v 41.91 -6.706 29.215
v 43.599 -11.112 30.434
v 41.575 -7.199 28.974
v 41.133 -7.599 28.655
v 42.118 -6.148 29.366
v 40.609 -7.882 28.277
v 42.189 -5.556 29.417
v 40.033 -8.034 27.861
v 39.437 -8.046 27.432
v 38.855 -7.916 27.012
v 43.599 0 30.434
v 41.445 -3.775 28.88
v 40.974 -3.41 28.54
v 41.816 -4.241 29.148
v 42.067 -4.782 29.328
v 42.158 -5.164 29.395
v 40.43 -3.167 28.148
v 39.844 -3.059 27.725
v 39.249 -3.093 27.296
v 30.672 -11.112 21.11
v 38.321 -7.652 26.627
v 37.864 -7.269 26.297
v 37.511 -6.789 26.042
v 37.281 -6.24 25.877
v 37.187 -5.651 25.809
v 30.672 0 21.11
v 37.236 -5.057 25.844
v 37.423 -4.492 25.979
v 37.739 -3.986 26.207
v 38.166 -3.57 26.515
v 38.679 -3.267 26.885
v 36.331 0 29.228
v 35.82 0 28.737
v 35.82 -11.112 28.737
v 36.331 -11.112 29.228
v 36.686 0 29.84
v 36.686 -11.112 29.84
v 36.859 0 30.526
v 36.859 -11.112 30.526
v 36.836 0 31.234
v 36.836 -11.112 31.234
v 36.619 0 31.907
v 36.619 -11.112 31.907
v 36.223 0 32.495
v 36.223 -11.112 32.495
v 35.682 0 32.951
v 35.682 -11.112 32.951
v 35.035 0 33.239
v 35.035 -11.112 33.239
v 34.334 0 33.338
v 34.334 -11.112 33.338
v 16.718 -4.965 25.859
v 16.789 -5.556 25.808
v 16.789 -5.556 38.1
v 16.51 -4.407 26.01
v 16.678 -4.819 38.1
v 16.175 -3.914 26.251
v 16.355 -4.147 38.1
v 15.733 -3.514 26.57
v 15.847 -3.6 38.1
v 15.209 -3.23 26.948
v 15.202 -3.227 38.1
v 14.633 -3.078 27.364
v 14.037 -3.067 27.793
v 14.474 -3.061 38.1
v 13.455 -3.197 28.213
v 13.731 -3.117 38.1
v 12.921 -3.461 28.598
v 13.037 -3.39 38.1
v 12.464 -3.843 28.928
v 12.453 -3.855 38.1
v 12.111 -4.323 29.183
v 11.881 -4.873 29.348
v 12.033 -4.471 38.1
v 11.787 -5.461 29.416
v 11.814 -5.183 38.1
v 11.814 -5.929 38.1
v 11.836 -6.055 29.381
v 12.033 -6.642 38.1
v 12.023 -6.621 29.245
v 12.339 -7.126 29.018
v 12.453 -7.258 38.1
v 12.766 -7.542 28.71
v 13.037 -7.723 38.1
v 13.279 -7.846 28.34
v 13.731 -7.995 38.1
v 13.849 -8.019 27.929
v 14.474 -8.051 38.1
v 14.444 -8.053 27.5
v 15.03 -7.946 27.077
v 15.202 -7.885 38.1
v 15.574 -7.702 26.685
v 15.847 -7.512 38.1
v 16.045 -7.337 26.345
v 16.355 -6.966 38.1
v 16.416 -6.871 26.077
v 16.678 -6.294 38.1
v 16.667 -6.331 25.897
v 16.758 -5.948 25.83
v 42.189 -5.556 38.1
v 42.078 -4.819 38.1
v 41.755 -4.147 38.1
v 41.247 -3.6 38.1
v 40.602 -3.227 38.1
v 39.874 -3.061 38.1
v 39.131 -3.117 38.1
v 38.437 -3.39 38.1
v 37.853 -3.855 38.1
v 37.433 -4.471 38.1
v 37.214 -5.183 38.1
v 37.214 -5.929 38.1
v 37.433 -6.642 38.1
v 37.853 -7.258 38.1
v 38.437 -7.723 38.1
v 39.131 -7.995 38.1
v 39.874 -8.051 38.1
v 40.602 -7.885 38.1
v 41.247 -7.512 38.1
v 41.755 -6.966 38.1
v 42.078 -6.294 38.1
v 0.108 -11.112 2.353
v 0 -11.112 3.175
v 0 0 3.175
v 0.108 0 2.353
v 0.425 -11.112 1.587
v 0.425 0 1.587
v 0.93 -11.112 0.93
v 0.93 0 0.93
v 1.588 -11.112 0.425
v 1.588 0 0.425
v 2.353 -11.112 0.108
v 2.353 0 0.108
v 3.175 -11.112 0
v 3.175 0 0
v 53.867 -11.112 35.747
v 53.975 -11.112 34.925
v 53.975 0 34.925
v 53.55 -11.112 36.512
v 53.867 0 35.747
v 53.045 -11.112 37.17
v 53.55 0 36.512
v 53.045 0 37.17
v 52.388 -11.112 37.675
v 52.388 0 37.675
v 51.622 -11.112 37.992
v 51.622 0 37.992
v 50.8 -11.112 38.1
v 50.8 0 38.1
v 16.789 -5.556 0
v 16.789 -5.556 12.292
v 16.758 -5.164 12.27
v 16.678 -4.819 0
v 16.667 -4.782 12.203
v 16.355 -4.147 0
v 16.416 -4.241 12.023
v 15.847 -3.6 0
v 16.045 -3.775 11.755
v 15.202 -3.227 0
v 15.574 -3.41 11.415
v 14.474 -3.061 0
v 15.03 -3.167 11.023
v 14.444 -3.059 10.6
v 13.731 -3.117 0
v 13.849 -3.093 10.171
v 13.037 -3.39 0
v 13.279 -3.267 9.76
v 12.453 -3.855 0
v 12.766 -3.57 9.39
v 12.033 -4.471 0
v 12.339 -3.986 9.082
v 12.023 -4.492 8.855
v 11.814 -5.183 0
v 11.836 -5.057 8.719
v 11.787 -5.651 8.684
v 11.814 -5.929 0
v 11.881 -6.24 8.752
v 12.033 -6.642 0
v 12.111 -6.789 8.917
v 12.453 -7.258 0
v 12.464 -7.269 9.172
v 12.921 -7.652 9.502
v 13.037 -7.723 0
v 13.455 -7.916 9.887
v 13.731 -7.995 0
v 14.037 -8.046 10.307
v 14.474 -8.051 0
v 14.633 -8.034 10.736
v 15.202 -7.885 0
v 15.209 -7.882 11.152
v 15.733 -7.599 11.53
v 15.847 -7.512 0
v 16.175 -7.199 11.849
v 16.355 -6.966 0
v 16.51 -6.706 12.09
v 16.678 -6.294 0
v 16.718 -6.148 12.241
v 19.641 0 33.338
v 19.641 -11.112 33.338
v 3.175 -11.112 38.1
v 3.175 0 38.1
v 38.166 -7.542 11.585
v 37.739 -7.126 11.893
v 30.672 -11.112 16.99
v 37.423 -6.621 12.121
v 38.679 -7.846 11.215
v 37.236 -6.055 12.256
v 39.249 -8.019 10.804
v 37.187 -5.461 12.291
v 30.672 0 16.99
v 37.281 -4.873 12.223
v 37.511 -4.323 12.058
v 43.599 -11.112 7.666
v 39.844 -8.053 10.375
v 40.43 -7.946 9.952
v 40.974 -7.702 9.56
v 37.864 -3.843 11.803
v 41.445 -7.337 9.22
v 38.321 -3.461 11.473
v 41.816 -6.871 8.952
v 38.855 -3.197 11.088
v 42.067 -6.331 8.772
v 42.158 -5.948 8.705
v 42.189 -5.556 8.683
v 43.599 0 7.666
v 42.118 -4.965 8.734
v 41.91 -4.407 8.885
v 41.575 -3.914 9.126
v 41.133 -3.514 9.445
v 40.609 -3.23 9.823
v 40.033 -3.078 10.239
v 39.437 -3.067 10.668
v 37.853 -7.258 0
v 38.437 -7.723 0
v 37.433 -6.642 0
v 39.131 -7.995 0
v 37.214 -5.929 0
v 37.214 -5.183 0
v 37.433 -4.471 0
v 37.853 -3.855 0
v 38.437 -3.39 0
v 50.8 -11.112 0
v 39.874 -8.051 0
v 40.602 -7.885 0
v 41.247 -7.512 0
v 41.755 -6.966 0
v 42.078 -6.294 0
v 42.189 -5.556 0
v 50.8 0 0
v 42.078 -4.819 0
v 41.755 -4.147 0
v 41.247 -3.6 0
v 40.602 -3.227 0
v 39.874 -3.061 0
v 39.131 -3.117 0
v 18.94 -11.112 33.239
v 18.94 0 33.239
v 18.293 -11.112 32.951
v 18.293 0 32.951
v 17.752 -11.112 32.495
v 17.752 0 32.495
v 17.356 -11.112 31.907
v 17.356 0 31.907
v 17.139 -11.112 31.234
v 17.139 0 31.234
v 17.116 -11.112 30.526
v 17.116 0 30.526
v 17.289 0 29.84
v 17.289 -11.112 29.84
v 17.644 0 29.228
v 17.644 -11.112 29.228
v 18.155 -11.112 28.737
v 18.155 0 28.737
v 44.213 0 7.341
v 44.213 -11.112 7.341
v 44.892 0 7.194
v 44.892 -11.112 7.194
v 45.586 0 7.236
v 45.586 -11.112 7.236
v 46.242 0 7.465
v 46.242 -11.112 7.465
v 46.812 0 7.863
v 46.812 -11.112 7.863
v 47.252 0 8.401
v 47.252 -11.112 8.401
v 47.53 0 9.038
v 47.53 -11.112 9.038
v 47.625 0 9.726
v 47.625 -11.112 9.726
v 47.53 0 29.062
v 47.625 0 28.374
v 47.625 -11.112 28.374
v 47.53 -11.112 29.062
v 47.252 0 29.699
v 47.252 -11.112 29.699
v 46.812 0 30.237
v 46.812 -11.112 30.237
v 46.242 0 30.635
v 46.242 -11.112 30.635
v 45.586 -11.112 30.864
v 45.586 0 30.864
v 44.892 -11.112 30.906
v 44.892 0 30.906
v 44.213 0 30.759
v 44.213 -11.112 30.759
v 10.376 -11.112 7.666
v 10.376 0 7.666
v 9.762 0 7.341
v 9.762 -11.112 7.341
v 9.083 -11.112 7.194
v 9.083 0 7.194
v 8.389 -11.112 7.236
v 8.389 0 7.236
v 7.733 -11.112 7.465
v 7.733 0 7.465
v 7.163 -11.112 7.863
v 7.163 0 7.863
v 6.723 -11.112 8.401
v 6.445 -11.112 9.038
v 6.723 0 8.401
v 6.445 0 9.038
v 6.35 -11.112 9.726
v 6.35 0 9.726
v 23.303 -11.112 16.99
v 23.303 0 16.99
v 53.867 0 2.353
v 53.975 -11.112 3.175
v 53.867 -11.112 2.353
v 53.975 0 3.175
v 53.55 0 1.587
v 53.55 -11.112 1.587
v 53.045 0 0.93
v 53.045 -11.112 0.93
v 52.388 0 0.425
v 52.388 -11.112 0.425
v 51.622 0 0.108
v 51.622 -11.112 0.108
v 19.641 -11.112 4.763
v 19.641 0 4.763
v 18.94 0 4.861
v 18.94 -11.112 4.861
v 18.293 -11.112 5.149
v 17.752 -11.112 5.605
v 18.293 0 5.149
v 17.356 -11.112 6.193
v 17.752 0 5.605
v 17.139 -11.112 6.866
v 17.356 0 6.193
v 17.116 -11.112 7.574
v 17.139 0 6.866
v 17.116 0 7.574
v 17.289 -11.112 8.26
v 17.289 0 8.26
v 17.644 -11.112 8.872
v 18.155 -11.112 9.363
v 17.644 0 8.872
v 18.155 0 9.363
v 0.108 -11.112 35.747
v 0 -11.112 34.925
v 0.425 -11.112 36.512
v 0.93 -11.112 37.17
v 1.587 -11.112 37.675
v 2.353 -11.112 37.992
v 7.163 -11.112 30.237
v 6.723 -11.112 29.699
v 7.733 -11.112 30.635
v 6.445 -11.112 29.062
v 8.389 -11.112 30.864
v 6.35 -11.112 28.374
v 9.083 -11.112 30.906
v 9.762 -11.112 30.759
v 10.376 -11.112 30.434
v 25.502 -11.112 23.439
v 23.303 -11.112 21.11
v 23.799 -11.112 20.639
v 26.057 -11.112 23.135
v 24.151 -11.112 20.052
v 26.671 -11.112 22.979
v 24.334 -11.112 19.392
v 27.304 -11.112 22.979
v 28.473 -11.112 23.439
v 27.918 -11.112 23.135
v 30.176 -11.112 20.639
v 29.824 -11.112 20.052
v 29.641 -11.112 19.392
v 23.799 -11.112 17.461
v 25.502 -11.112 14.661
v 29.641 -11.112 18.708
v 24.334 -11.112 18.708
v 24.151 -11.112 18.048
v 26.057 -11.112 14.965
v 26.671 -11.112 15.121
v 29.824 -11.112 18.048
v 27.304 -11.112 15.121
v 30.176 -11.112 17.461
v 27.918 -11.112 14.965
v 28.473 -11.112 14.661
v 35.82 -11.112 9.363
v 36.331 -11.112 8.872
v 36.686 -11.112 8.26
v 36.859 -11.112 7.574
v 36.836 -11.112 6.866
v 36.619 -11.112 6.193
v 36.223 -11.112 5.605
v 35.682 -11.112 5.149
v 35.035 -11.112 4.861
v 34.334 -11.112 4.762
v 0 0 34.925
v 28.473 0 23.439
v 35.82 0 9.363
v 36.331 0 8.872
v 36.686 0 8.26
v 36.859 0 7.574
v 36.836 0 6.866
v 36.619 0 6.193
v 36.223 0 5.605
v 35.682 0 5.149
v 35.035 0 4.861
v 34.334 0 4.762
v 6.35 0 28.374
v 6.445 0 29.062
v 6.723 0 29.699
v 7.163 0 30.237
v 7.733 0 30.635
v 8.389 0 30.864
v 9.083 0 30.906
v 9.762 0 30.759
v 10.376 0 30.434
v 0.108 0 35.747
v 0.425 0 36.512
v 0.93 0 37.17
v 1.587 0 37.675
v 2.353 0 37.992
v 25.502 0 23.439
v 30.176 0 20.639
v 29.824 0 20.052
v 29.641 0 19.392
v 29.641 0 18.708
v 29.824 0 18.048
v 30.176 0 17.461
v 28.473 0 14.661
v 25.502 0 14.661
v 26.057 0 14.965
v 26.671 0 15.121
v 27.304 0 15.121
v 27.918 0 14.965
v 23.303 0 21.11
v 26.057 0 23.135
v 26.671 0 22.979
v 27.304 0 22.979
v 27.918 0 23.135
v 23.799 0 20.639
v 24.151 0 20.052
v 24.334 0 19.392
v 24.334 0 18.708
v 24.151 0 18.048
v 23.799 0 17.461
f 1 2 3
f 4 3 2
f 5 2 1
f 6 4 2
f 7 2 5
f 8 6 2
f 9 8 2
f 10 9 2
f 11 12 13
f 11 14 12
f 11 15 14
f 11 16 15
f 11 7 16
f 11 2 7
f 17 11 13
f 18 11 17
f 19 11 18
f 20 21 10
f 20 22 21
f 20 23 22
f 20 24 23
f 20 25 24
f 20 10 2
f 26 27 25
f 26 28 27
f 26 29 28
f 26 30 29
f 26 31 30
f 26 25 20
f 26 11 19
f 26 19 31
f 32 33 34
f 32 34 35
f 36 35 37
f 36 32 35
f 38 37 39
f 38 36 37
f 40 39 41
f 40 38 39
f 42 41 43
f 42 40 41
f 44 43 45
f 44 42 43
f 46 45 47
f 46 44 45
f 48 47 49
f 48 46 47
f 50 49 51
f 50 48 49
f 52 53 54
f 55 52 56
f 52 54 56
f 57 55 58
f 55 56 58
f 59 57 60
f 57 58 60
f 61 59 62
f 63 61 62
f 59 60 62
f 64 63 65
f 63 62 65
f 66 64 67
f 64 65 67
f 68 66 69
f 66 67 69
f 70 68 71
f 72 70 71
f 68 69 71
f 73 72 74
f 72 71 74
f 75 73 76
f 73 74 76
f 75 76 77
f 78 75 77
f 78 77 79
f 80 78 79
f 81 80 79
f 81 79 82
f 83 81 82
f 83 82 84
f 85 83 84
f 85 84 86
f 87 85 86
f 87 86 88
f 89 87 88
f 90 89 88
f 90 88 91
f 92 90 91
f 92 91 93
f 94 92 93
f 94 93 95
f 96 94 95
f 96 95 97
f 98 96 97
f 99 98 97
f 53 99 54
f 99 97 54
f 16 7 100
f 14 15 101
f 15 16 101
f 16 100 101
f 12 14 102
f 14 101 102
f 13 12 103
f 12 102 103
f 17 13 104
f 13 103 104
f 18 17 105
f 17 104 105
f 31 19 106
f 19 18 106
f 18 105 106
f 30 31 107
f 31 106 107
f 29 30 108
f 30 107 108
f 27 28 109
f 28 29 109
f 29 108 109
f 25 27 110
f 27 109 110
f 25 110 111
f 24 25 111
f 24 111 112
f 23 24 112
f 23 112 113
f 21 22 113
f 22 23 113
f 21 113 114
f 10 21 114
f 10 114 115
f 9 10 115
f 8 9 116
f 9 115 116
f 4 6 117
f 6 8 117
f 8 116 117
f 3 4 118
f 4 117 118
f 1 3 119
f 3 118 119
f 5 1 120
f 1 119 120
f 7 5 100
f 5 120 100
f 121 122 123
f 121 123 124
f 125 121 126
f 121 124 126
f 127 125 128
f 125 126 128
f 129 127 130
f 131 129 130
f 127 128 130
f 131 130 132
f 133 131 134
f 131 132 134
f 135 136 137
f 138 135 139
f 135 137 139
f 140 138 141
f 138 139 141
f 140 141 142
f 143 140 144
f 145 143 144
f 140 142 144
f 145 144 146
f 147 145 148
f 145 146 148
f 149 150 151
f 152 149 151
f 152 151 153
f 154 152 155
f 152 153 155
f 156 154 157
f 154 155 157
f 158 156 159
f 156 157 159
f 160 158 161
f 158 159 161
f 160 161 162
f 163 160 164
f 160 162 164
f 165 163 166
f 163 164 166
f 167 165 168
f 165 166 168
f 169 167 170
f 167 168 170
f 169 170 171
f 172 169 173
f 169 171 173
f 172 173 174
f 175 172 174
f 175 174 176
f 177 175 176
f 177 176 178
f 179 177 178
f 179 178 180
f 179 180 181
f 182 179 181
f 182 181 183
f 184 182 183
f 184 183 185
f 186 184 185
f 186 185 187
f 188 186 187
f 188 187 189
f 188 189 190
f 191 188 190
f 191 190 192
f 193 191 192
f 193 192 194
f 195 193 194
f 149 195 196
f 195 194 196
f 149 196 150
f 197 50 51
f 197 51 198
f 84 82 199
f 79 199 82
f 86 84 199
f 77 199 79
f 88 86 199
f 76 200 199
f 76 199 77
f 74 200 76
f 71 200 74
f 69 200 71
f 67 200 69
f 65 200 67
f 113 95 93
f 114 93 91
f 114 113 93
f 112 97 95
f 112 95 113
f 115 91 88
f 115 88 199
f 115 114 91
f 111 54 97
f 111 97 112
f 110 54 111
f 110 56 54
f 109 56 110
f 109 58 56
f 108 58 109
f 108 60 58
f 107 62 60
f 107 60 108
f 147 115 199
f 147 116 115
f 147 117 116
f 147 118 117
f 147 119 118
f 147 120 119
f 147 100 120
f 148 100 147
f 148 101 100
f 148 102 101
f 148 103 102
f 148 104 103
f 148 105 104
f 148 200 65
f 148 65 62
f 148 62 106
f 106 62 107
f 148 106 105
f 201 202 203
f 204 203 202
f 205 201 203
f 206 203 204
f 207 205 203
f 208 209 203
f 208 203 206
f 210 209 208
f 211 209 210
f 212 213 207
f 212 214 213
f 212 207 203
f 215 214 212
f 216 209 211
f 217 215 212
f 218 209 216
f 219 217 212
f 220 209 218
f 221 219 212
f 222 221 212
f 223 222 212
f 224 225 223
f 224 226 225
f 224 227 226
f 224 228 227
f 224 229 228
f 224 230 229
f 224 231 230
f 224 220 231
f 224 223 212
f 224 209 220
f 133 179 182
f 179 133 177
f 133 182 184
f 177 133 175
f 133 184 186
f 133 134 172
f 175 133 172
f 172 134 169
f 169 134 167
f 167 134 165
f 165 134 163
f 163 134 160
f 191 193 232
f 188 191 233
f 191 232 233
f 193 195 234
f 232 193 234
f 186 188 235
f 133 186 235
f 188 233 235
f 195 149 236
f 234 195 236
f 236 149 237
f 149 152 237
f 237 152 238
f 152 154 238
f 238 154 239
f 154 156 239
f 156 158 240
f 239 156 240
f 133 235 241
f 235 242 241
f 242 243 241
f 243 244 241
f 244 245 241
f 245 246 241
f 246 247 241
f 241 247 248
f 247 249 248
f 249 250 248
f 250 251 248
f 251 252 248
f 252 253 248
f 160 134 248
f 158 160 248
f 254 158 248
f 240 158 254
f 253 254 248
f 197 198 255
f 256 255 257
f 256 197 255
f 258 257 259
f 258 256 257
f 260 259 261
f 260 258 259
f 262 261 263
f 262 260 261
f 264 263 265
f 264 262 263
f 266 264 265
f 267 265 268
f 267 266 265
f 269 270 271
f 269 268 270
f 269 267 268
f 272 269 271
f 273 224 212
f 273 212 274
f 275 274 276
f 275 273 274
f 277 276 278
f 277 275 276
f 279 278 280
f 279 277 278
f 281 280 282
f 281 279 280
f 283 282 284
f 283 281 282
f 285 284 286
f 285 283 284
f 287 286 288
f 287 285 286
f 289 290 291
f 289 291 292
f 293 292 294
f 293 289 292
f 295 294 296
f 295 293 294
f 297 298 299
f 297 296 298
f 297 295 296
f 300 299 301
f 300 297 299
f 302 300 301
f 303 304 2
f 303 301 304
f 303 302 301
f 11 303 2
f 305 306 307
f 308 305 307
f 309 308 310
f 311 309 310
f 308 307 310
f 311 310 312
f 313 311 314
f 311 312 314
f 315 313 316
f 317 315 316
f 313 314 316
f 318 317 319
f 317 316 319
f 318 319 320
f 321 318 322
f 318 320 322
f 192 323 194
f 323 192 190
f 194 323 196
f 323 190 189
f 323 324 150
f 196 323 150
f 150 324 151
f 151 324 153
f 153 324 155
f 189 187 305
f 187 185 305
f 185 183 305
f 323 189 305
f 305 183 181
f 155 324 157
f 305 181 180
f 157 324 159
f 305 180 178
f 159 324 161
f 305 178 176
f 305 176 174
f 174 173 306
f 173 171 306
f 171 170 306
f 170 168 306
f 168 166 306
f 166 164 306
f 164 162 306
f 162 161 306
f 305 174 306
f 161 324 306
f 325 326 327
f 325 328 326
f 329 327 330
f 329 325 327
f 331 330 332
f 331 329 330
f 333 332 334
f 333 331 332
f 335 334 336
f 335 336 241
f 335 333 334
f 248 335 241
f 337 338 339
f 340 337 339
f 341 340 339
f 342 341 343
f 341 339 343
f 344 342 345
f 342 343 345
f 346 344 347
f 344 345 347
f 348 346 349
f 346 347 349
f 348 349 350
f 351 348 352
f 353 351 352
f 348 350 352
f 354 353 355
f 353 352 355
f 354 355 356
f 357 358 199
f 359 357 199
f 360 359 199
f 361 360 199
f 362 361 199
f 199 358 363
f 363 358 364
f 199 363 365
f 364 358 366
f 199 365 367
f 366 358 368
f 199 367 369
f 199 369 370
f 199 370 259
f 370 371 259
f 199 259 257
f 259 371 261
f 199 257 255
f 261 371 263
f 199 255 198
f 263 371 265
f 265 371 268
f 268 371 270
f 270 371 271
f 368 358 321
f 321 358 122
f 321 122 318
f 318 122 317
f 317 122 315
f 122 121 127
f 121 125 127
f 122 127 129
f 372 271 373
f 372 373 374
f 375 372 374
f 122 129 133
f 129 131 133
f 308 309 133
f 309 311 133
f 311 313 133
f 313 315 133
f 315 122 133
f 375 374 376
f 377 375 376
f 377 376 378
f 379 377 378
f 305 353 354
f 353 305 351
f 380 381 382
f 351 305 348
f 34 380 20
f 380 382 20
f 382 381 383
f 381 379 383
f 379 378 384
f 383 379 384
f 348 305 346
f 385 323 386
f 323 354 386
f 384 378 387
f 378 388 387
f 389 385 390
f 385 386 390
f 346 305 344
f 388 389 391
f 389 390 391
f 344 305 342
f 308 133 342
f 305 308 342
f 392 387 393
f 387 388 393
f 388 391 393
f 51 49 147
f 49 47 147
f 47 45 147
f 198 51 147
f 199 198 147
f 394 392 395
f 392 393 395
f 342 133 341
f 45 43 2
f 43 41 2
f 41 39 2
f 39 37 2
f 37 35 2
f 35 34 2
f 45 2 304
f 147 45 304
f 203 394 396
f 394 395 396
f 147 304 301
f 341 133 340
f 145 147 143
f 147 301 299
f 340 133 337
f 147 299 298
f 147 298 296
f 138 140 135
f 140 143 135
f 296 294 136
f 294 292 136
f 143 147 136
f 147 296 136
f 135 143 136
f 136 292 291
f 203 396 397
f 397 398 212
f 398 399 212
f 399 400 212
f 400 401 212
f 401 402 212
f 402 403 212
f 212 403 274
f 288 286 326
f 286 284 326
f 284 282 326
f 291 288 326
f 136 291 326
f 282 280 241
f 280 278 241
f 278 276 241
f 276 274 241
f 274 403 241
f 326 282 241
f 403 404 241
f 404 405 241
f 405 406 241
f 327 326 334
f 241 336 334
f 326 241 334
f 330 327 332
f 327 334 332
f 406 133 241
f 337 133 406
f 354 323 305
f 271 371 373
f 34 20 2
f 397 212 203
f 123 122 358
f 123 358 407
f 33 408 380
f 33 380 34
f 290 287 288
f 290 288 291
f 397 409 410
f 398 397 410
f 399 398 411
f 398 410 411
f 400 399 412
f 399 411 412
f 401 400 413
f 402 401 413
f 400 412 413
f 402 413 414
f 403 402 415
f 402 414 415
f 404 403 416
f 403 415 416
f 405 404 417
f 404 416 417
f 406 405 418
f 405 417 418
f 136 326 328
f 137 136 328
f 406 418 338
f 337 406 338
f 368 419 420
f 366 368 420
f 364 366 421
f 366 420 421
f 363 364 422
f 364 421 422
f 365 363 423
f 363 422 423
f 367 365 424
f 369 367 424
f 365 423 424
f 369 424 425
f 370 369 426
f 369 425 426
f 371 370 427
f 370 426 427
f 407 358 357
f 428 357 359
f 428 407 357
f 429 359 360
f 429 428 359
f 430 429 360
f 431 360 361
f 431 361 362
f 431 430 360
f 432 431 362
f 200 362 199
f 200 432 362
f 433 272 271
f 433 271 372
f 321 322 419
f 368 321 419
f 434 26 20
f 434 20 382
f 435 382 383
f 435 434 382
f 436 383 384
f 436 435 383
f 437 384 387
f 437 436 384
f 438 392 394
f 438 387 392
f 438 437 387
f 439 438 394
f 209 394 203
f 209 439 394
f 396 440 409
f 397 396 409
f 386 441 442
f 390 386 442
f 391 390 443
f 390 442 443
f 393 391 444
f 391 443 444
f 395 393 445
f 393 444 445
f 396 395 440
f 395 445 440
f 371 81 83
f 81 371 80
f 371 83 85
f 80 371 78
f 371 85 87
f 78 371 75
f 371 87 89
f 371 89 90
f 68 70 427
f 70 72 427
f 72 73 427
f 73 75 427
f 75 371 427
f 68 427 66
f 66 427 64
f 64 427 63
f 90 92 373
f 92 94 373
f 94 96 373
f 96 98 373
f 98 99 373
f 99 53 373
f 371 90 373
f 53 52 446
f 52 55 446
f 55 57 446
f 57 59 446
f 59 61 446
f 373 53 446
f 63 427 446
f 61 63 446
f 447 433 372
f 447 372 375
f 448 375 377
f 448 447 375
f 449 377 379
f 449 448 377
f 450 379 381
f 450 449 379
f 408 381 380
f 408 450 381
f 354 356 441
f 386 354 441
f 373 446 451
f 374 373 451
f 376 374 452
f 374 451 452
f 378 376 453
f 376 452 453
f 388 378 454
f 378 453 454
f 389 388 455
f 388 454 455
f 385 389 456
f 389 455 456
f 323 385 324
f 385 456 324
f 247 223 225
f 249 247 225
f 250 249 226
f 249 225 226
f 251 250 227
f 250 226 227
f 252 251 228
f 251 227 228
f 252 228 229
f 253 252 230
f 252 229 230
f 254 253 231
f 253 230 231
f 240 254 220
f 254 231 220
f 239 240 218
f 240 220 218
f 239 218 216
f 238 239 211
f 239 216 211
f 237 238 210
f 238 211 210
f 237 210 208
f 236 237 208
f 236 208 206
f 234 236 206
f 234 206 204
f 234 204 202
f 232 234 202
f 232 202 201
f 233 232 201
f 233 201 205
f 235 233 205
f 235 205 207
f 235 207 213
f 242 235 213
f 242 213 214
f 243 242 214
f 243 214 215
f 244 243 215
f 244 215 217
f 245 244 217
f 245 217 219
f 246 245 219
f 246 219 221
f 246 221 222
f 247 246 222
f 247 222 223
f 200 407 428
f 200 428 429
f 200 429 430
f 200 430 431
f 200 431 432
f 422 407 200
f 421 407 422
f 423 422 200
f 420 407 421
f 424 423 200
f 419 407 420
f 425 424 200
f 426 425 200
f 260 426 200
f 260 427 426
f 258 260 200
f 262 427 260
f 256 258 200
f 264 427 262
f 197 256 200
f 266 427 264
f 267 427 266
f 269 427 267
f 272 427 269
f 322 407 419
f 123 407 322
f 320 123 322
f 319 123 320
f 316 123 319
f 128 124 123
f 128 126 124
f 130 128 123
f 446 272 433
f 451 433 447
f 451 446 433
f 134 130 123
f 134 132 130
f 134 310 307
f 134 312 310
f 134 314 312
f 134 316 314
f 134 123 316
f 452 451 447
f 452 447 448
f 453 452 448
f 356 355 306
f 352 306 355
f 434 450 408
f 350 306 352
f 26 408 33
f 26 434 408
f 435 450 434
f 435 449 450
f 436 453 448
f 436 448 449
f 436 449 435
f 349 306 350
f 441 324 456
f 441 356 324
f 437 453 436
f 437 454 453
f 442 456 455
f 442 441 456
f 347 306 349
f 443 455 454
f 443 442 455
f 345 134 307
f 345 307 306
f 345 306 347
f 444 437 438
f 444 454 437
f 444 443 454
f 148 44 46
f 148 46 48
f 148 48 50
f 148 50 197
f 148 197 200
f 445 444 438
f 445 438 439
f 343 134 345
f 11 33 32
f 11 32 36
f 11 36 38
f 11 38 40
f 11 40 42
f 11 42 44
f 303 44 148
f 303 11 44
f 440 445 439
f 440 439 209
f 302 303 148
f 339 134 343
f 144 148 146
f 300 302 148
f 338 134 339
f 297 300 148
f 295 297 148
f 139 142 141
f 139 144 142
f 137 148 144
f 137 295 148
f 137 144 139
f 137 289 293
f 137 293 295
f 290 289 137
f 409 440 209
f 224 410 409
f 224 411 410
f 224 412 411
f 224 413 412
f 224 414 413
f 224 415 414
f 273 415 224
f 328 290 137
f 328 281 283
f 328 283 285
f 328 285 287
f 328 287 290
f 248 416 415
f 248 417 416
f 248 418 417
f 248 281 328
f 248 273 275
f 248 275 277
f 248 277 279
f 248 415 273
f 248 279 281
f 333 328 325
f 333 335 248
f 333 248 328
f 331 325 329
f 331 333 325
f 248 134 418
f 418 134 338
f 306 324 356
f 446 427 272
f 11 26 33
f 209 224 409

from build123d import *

# Parameters (mm, degrees)
SKETCH1_W           = 53.975
SKETCH1_H           = 11.1125
BOSS_EXTRUDE1_DEPTH = 38.1
FILLET1_R           = 3.175
CUT_EXTRUDE1_DEPTH  = 67.995509411
SKETCH3_R           = 2.5019
CUT_EXTRUDE2_DEPTH  = 38.1


with BuildPart() as part:
    # Sketch1 → Boss-Extrude1 (new body)
    with BuildSketch(Plane.XY):
        with Locations((26.9875, -5.55625)):
            Rectangle(SKETCH1_W, SKETCH1_H)
    extrude(amount=BOSS_EXTRUDE1_DEPTH)

    # Fillet1
    fillet1_edges = [part.edges().sort_by_distance(p)[0] for p in [
        (0, -5.55625, 38.1),
        (0, -5.55625, 0),
        (53.975, -5.55625, 0),
        (53.975, -5.55625, 38.1),
    ]]
    fillet(fillet1_edges, radius=FILLET1_R)

    # Sketch2 → Cut-Extrude1 (cut, through all)
    with BuildSketch(Plane(origin=(0, 0, 0), x_dir=(1, 0, 0), z_dir=(0, 1, 0))):
        with BuildLine():
            Line((6.35, -9.726273849), (6.35, -28.373726151))
            ThreePointArc((6.35, -28.373726151), (7.732948935, -30.63488356), (10.375852624, -30.433784883))
            Line((10.375852624, -30.433784883), (23.302722469, -21.110058732))
            ThreePointArc((23.302722469, -21.110058732), (24.356869845, -19.05), (23.302722469, -16.989941268))
            Line((23.302722469, -16.989941268), (10.375852624, -7.666215117))
            ThreePointArc((10.375852624, -7.666215117), (7.732948935, -7.46511644), (6.35, -9.726273849))
        make_face()
        with BuildLine():
            Line((18.155269838, -9.362558732), (25.501647376, -14.661259283))
            ThreePointArc((25.501647376, -14.661259283), (26.9875, -15.141200551), (28.473352624, -14.661259283))
            Line((28.473352624, -14.661259283), (35.819730162, -9.362558732))
            ThreePointArc((35.819730162, -9.362558732), (36.750915931, -6.521778917), (34.333877539, -4.7625))
            Line((34.333877539, -4.7625), (19.641122461, -4.7625))
            ThreePointArc((19.641122461, -4.7625), (17.224084069, -6.521778917), (18.155269838, -9.362558732))
        make_face()
        with BuildLine():
            Line((18.155269838, -28.737441268), (25.501647376, -23.438740717))
            ThreePointArc((25.501647376, -23.438740717), (26.9875, -22.958799449), (28.473352624, -23.438740717))
            Line((28.473352624, -23.438740717), (35.819730162, -28.737441268))
            ThreePointArc((35.819730162, -28.737441268), (36.750915931, -31.578221083), (34.333877539, -33.3375))
            Line((34.333877539, -33.3375), (19.641122461, -33.3375))
            ThreePointArc((19.641122461, -33.3375), (17.224084069, -31.578221083), (18.155269838, -28.737441268))
        make_face()
        with BuildLine():
            Line((47.625, -9.726273849), (47.625, -28.373726151))
            ThreePointArc((47.625, -28.373726151), (46.242051065, -30.63488356), (43.599147376, -30.433784883))
            Line((43.599147376, -30.433784883), (30.672277531, -21.110058732))
            ThreePointArc((30.672277531, -21.110058732), (29.618130155, -19.05), (30.672277531, -16.989941268))
            Line((30.672277531, -16.989941268), (43.599147376, -7.666215117))
            ThreePointArc((43.599147376, -7.666215117), (46.242051065, -7.46511644), (47.625, -9.726273849))
        make_face()
    extrude(amount=-CUT_EXTRUDE1_DEPTH, mode=Mode.SUBTRACT)

    # Sketch3 → Cut-Extrude2 (cut)
    with BuildSketch(Plane.XY.offset(38.1)):
        with Locations((14.2875, -5.55625)):
            Circle(SKETCH3_R)
        with Locations((39.6875, -5.55625)):
            Circle(SKETCH3_R)
    extrude(amount=-CUT_EXTRUDE2_DEPTH, mode=Mode.SUBTRACT)


solid = part.part
